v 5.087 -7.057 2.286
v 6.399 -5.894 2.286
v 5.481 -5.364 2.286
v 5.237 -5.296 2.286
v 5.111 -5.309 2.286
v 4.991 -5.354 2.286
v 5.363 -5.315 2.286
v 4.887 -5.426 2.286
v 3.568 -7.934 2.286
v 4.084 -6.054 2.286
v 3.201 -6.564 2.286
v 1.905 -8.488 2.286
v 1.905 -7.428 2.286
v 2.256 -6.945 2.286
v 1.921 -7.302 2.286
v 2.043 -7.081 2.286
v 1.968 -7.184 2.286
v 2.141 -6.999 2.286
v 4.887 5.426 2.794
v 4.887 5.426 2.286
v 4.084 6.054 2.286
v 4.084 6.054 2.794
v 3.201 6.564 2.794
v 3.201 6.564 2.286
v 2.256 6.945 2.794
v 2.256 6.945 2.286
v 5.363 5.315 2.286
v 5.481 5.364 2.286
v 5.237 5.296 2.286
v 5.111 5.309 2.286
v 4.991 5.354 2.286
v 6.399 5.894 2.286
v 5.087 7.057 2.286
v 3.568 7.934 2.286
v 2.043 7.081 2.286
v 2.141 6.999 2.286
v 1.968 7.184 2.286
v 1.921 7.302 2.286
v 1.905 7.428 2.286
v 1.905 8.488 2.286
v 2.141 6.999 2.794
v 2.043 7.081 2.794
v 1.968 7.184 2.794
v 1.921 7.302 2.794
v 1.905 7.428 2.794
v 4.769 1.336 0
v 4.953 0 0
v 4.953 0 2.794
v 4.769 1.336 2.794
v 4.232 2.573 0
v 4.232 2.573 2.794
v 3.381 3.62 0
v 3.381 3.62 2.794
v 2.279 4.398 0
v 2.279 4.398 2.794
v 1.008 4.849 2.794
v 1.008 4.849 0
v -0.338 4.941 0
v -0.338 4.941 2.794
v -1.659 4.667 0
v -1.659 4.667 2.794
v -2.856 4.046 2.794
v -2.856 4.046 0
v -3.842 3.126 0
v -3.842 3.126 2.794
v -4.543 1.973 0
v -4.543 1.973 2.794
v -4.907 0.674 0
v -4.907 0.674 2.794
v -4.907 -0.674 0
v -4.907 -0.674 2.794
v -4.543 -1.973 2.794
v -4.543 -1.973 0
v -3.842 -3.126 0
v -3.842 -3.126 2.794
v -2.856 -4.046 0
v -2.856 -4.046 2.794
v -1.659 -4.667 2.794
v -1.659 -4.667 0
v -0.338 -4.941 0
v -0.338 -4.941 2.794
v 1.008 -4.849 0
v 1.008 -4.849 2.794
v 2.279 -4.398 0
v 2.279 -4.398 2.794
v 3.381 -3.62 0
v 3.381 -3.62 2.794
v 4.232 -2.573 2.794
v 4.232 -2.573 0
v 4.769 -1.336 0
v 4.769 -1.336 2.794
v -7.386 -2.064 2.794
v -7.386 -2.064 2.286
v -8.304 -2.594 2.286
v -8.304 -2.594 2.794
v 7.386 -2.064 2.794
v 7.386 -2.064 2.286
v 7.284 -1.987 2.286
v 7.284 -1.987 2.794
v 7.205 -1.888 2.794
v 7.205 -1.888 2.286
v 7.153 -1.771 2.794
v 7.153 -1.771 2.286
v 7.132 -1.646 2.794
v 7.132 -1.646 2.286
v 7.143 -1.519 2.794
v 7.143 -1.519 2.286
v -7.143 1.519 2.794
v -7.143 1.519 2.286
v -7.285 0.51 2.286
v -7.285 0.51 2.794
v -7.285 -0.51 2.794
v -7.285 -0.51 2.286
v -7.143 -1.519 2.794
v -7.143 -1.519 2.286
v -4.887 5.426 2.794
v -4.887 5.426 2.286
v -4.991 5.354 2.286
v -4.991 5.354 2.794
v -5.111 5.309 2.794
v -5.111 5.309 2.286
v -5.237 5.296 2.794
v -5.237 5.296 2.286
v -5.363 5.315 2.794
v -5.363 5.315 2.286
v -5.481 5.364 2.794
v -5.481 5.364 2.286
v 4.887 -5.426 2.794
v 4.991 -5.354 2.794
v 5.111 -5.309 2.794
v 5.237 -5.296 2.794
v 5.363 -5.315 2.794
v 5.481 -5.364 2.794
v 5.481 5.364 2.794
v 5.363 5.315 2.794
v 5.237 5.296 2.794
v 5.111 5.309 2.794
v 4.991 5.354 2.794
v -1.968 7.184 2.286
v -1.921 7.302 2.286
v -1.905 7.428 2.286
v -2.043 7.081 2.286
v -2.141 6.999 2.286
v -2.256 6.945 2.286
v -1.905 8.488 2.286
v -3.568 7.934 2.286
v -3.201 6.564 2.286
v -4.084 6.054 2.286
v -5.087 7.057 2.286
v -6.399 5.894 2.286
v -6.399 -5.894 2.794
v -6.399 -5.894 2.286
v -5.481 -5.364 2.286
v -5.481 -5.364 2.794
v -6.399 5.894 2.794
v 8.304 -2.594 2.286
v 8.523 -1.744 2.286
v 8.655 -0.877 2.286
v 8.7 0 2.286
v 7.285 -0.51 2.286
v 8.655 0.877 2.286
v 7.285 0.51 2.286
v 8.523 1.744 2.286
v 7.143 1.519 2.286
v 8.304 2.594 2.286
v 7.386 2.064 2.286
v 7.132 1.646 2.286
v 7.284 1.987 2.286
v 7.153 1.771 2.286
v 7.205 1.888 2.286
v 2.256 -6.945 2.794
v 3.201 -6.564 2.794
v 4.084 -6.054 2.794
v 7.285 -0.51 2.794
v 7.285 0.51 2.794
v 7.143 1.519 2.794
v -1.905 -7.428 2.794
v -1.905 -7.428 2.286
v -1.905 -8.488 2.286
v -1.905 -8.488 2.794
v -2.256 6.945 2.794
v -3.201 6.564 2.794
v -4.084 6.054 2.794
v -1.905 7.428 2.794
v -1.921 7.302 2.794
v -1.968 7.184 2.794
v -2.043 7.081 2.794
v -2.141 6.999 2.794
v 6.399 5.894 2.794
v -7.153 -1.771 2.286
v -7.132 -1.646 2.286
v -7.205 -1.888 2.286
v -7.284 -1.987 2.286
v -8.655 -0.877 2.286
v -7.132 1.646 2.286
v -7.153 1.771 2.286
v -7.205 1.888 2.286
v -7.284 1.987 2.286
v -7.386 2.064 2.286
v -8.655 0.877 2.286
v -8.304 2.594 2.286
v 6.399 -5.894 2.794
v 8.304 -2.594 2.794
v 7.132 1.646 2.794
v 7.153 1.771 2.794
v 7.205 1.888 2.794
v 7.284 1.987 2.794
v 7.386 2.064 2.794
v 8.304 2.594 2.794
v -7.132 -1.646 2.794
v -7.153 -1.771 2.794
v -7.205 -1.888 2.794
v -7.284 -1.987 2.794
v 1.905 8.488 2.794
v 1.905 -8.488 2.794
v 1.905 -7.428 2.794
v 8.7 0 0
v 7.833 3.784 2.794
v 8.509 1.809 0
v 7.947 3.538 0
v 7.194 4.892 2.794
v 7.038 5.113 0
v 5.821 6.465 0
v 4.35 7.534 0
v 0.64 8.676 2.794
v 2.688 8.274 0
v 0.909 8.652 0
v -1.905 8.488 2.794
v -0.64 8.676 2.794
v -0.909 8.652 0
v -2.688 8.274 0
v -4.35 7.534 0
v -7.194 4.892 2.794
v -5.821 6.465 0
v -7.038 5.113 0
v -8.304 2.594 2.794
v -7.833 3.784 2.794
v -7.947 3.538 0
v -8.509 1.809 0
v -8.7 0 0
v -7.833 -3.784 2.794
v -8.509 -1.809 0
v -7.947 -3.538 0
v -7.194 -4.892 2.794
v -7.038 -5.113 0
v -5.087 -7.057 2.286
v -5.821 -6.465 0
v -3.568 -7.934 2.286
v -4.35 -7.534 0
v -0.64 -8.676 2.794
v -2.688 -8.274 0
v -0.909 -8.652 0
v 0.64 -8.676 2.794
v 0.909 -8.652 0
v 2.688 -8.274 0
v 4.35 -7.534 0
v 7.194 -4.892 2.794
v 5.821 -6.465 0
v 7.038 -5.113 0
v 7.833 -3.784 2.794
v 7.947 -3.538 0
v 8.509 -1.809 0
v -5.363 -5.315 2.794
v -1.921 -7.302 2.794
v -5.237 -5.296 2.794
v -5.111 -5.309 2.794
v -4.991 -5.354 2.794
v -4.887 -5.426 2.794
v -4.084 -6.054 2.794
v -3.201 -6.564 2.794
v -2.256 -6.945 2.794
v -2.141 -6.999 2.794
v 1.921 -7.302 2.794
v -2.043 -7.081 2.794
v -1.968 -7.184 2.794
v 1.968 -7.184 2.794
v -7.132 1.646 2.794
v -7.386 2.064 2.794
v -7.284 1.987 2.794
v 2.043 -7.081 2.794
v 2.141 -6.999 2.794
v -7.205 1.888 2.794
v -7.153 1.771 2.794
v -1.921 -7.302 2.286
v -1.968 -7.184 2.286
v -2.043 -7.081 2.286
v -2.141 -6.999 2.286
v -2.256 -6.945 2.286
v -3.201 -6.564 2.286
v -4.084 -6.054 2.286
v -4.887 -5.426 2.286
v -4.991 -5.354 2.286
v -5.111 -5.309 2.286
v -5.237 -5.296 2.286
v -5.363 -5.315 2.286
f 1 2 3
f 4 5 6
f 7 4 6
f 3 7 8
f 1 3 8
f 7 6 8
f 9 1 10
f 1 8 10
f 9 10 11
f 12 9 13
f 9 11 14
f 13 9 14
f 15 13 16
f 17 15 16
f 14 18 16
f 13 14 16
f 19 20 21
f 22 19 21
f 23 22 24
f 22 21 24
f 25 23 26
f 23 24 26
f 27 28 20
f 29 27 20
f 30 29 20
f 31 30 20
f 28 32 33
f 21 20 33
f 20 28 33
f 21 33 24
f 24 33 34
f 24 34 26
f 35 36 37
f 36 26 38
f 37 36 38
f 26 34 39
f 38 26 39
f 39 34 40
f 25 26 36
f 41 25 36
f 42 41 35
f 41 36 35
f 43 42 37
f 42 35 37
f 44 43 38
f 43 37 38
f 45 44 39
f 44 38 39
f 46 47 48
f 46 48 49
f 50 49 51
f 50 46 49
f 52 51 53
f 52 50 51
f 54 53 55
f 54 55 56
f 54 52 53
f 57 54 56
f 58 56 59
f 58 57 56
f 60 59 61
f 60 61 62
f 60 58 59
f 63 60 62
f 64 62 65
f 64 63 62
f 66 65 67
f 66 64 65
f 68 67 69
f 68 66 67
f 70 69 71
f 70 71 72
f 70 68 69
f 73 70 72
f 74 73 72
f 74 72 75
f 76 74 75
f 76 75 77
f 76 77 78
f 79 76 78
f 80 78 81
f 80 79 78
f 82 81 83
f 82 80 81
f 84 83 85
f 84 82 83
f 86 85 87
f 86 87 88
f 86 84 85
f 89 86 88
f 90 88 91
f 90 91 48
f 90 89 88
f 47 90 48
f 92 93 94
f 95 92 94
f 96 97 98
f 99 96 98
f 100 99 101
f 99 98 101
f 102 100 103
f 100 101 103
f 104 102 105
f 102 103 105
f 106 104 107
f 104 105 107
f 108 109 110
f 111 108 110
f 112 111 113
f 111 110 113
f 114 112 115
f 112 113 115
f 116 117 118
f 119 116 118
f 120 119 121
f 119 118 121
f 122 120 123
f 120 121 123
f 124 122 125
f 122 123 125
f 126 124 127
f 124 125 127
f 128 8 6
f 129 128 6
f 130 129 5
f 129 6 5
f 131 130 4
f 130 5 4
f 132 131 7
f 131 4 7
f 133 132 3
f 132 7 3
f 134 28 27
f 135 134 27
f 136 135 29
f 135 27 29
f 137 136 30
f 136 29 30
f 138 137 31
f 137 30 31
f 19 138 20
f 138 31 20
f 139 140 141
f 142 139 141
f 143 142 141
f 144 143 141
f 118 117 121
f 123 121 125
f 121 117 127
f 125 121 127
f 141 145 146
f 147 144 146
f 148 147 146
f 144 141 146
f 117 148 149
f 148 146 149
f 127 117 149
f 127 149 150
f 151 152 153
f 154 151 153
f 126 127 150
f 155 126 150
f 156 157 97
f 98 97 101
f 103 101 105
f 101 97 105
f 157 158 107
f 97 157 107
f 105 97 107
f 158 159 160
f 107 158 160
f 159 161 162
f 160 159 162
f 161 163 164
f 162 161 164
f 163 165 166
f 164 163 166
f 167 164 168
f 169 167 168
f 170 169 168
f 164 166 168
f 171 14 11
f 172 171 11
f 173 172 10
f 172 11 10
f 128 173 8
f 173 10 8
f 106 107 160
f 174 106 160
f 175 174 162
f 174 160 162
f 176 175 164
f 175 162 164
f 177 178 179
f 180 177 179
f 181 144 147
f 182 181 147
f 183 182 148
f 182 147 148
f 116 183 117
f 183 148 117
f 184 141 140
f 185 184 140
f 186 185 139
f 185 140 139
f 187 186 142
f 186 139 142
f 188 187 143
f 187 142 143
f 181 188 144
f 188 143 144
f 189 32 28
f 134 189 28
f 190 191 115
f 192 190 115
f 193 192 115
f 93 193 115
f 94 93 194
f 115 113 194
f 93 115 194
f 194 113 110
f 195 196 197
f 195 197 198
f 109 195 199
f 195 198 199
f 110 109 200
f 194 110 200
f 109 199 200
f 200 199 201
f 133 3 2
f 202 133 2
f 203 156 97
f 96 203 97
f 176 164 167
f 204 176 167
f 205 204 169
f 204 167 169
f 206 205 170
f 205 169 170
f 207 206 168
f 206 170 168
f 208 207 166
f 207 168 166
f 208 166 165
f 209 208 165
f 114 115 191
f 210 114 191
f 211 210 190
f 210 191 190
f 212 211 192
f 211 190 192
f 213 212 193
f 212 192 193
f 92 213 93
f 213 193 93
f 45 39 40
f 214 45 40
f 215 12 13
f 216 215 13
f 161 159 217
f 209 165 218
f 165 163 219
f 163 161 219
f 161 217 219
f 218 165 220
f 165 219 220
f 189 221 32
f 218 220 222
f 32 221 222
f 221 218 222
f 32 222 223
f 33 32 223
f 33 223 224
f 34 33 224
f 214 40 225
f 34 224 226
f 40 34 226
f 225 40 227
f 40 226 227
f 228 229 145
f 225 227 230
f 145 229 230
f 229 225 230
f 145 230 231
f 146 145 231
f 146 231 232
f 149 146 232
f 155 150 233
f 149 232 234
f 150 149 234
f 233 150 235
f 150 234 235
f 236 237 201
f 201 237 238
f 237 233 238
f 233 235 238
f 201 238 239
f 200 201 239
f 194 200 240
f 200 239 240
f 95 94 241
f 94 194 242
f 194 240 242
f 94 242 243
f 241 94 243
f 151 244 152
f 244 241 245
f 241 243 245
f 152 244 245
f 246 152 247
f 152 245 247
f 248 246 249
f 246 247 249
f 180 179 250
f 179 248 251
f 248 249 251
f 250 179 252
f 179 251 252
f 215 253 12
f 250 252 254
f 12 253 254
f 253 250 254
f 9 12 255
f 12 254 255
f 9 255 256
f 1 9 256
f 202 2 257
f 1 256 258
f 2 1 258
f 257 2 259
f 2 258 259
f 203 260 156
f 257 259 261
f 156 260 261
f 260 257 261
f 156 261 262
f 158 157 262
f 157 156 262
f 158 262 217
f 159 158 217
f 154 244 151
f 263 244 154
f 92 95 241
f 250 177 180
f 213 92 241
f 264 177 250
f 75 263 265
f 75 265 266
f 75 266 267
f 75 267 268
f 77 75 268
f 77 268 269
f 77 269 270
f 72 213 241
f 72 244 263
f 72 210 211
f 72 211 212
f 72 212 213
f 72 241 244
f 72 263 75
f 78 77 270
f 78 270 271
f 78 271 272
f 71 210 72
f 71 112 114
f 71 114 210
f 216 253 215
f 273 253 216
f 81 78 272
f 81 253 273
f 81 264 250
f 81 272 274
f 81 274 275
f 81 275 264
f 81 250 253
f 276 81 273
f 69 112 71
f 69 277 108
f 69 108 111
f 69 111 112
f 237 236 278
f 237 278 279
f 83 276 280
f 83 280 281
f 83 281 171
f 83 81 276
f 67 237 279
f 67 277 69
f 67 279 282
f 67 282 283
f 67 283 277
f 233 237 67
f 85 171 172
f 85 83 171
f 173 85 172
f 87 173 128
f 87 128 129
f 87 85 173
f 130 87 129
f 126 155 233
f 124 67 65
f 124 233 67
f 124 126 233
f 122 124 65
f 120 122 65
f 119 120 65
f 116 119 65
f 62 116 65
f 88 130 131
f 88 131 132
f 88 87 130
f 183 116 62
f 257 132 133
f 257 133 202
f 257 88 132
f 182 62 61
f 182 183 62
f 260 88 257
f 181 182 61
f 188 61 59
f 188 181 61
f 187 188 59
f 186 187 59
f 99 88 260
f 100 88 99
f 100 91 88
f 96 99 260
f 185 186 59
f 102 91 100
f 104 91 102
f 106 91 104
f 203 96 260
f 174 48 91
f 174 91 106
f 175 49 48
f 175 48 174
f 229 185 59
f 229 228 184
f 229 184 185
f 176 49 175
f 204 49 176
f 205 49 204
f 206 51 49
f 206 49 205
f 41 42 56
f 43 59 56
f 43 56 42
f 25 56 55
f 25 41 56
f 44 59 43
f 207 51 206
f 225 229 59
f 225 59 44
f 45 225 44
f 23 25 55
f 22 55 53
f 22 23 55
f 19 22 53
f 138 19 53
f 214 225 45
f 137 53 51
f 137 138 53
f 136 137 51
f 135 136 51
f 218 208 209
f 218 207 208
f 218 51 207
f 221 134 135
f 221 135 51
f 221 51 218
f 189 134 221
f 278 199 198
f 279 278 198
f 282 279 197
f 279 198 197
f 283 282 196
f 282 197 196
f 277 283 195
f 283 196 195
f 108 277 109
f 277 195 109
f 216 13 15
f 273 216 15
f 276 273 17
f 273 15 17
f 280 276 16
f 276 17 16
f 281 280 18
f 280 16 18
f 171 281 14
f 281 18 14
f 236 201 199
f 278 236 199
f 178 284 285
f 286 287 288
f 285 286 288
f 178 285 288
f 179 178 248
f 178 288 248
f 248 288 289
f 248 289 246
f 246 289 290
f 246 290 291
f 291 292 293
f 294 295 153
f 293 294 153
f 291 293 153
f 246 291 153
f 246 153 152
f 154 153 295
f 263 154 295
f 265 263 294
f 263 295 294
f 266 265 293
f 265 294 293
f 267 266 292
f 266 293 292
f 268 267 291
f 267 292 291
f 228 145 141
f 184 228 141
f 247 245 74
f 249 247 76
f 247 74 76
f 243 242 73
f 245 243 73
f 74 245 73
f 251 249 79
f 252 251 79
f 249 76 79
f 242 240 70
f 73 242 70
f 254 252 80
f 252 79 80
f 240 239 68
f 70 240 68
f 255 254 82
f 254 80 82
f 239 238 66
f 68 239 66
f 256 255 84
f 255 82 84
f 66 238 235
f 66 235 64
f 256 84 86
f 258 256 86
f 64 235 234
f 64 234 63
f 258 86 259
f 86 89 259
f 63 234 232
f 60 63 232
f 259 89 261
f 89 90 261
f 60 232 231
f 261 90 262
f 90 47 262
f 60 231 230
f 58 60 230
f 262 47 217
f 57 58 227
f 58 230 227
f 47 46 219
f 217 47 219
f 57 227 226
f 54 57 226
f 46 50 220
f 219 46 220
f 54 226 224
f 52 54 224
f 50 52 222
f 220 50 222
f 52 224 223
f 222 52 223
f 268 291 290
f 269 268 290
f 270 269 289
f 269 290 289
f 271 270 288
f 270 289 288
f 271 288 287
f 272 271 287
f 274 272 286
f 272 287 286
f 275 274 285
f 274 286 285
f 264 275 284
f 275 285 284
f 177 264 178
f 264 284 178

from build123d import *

# Parameters (mm, degrees)
SKETCH1_R           = 8.6995
SKETCH1_R_2         = 4.953
BOSS_EXTRUDE1_DEPTH = 2.794
CUT_EXTRUDE1_START  = -0.508
CUT_EXTRUDE1_DEPTH  = 0.508


with BuildPart() as part:
    # Sketch1 → Boss-Extrude1 (new body)
    with BuildSketch(Plane.XY):
        Circle(SKETCH1_R)
        Circle(SKETCH1_R_2, mode=Mode.SUBTRACT)
    extrude(amount=BOSS_EXTRUDE1_DEPTH)

    # Sketch2 → Cut-Extrude1 (cut)
    with BuildSketch(Plane.XY.offset(2.794).offset(CUT_EXTRUDE1_START)):
        with BuildLine():
            Line((7.385695624, 2.064428831), (8.303636404, 2.594402188))
            ThreePointArc((8.303636404, 2.594402188), (8.6995, 0), (8.303636405, -2.594402188))
            Line((8.303636405, -2.594402188), (7.385695624, -2.064428831))
            ThreePointArc((7.385695624, -2.064428831), (7.175606504, -1.831092109), (7.142804852, -1.518830175))
            ThreePointArc((7.142804852, -1.518830175), (7.3025, 0), (7.142804852, 1.518830175))
            ThreePointArc((7.142804852, 1.518830175), (7.175606504, 1.831092109), (7.385695624, 2.064428831))
        make_face()
        with BuildLine():
            Line((5.480695624, -5.363985619), (6.398636405, -5.893958976))
            ThreePointArc((6.398636405, -5.893958976), (4.34975, -7.533988), (1.905, -8.488361164))
            Line((1.905, -8.488361164), (1.905, -7.428414451))
            ThreePointArc((1.905, -7.428414451), (2.002030969, -7.129803575), (2.256056911, -6.945265543))
            ThreePointArc((2.256056911, -6.945265543), (3.65125, -6.324150511), (4.886747941, -5.426435369))
            ThreePointArc((4.886747941, -5.426435369), (5.173575535, -5.298711465), (5.480695624, -5.363985619))
        make_face()
        with BuildLine():
            Line((-1.905, -7.428414451), (-1.905, -8.488361164))
            ThreePointArc((-1.905, -8.488361164), (-4.34975, -7.533988), (-6.398636404, -5.893958976))
            Line((-6.398636404, -5.893958976), (-5.480695624, -5.36398562))
            ThreePointArc((-5.480695624, -5.36398562), (-5.173575535, -5.298711465), (-4.886747941, -5.426435369))
            ThreePointArc((-4.886747941, -5.426435369), (-3.65125, -6.324150511), (-2.256056911, -6.945265543))
            ThreePointArc((-2.256056911, -6.945265543), (-2.002030969, -7.129803575), (-1.905, -7.428414451))
        make_face()
        with BuildLine():
            Line((-7.385695624, -2.064428831), (-8.303636404, -2.594402188))
            ThreePointArc((-8.303636404, -2.594402188), (-8.6995, 0), (-8.303636405, 2.594402188))
            Line((-8.303636405, 2.594402188), (-7.385695624, 2.064428831))
            ThreePointArc((-7.385695624, 2.064428831), (-7.175606504, 1.831092109), (-7.142804852, 1.518830175))
            ThreePointArc((-7.142804852, 1.518830175), (-7.3025, 0), (-7.142804852, -1.518830175))
            ThreePointArc((-7.142804852, -1.518830175), (-7.175606504, -1.831092109), (-7.385695624, -2.064428831))
        make_face()
        with BuildLine():
            Line((-5.480695624, 5.363985619), (-6.398636405, 5.893958976))
            ThreePointArc((-6.398636405, 5.893958976), (-4.34975, 7.533988), (-1.905, 8.488361164))
            Line((-1.905, 8.488361164), (-1.905, 7.428414451))
            ThreePointArc((-1.905, 7.428414451), (-2.002030969, 7.129803575), (-2.256056911, 6.945265543))
            ThreePointArc((-2.256056911, 6.945265543), (-3.65125, 6.324150511), (-4.886747941, 5.426435369))
            ThreePointArc((-4.886747941, 5.426435369), (-5.173575535, 5.298711465), (-5.480695624, 5.363985619))
        make_face()
        with BuildLine():
            Line((6.398636404, 5.893958976), (5.480695624, 5.36398562))
            ThreePointArc((5.480695624, 5.36398562), (5.173575535, 5.298711465), (4.886747941, 5.426435369))
            ThreePointArc((4.886747941, 5.426435369), (3.65125, 6.324150511), (2.256056911, 6.945265543))
            ThreePointArc((2.256056911, 6.945265543), (2.002030969, 7.129803575), (1.905, 7.428414451))
            Line((1.905, 7.428414451), (1.905, 8.488361164))
            ThreePointArc((1.905, 8.488361164), (4.34975, 7.533988), (6.398636404, 5.893958976))
        make_face()
    extrude(amount=CUT_EXTRUDE1_DEPTH, mode=Mode.SUBTRACT)


solid = part.part
